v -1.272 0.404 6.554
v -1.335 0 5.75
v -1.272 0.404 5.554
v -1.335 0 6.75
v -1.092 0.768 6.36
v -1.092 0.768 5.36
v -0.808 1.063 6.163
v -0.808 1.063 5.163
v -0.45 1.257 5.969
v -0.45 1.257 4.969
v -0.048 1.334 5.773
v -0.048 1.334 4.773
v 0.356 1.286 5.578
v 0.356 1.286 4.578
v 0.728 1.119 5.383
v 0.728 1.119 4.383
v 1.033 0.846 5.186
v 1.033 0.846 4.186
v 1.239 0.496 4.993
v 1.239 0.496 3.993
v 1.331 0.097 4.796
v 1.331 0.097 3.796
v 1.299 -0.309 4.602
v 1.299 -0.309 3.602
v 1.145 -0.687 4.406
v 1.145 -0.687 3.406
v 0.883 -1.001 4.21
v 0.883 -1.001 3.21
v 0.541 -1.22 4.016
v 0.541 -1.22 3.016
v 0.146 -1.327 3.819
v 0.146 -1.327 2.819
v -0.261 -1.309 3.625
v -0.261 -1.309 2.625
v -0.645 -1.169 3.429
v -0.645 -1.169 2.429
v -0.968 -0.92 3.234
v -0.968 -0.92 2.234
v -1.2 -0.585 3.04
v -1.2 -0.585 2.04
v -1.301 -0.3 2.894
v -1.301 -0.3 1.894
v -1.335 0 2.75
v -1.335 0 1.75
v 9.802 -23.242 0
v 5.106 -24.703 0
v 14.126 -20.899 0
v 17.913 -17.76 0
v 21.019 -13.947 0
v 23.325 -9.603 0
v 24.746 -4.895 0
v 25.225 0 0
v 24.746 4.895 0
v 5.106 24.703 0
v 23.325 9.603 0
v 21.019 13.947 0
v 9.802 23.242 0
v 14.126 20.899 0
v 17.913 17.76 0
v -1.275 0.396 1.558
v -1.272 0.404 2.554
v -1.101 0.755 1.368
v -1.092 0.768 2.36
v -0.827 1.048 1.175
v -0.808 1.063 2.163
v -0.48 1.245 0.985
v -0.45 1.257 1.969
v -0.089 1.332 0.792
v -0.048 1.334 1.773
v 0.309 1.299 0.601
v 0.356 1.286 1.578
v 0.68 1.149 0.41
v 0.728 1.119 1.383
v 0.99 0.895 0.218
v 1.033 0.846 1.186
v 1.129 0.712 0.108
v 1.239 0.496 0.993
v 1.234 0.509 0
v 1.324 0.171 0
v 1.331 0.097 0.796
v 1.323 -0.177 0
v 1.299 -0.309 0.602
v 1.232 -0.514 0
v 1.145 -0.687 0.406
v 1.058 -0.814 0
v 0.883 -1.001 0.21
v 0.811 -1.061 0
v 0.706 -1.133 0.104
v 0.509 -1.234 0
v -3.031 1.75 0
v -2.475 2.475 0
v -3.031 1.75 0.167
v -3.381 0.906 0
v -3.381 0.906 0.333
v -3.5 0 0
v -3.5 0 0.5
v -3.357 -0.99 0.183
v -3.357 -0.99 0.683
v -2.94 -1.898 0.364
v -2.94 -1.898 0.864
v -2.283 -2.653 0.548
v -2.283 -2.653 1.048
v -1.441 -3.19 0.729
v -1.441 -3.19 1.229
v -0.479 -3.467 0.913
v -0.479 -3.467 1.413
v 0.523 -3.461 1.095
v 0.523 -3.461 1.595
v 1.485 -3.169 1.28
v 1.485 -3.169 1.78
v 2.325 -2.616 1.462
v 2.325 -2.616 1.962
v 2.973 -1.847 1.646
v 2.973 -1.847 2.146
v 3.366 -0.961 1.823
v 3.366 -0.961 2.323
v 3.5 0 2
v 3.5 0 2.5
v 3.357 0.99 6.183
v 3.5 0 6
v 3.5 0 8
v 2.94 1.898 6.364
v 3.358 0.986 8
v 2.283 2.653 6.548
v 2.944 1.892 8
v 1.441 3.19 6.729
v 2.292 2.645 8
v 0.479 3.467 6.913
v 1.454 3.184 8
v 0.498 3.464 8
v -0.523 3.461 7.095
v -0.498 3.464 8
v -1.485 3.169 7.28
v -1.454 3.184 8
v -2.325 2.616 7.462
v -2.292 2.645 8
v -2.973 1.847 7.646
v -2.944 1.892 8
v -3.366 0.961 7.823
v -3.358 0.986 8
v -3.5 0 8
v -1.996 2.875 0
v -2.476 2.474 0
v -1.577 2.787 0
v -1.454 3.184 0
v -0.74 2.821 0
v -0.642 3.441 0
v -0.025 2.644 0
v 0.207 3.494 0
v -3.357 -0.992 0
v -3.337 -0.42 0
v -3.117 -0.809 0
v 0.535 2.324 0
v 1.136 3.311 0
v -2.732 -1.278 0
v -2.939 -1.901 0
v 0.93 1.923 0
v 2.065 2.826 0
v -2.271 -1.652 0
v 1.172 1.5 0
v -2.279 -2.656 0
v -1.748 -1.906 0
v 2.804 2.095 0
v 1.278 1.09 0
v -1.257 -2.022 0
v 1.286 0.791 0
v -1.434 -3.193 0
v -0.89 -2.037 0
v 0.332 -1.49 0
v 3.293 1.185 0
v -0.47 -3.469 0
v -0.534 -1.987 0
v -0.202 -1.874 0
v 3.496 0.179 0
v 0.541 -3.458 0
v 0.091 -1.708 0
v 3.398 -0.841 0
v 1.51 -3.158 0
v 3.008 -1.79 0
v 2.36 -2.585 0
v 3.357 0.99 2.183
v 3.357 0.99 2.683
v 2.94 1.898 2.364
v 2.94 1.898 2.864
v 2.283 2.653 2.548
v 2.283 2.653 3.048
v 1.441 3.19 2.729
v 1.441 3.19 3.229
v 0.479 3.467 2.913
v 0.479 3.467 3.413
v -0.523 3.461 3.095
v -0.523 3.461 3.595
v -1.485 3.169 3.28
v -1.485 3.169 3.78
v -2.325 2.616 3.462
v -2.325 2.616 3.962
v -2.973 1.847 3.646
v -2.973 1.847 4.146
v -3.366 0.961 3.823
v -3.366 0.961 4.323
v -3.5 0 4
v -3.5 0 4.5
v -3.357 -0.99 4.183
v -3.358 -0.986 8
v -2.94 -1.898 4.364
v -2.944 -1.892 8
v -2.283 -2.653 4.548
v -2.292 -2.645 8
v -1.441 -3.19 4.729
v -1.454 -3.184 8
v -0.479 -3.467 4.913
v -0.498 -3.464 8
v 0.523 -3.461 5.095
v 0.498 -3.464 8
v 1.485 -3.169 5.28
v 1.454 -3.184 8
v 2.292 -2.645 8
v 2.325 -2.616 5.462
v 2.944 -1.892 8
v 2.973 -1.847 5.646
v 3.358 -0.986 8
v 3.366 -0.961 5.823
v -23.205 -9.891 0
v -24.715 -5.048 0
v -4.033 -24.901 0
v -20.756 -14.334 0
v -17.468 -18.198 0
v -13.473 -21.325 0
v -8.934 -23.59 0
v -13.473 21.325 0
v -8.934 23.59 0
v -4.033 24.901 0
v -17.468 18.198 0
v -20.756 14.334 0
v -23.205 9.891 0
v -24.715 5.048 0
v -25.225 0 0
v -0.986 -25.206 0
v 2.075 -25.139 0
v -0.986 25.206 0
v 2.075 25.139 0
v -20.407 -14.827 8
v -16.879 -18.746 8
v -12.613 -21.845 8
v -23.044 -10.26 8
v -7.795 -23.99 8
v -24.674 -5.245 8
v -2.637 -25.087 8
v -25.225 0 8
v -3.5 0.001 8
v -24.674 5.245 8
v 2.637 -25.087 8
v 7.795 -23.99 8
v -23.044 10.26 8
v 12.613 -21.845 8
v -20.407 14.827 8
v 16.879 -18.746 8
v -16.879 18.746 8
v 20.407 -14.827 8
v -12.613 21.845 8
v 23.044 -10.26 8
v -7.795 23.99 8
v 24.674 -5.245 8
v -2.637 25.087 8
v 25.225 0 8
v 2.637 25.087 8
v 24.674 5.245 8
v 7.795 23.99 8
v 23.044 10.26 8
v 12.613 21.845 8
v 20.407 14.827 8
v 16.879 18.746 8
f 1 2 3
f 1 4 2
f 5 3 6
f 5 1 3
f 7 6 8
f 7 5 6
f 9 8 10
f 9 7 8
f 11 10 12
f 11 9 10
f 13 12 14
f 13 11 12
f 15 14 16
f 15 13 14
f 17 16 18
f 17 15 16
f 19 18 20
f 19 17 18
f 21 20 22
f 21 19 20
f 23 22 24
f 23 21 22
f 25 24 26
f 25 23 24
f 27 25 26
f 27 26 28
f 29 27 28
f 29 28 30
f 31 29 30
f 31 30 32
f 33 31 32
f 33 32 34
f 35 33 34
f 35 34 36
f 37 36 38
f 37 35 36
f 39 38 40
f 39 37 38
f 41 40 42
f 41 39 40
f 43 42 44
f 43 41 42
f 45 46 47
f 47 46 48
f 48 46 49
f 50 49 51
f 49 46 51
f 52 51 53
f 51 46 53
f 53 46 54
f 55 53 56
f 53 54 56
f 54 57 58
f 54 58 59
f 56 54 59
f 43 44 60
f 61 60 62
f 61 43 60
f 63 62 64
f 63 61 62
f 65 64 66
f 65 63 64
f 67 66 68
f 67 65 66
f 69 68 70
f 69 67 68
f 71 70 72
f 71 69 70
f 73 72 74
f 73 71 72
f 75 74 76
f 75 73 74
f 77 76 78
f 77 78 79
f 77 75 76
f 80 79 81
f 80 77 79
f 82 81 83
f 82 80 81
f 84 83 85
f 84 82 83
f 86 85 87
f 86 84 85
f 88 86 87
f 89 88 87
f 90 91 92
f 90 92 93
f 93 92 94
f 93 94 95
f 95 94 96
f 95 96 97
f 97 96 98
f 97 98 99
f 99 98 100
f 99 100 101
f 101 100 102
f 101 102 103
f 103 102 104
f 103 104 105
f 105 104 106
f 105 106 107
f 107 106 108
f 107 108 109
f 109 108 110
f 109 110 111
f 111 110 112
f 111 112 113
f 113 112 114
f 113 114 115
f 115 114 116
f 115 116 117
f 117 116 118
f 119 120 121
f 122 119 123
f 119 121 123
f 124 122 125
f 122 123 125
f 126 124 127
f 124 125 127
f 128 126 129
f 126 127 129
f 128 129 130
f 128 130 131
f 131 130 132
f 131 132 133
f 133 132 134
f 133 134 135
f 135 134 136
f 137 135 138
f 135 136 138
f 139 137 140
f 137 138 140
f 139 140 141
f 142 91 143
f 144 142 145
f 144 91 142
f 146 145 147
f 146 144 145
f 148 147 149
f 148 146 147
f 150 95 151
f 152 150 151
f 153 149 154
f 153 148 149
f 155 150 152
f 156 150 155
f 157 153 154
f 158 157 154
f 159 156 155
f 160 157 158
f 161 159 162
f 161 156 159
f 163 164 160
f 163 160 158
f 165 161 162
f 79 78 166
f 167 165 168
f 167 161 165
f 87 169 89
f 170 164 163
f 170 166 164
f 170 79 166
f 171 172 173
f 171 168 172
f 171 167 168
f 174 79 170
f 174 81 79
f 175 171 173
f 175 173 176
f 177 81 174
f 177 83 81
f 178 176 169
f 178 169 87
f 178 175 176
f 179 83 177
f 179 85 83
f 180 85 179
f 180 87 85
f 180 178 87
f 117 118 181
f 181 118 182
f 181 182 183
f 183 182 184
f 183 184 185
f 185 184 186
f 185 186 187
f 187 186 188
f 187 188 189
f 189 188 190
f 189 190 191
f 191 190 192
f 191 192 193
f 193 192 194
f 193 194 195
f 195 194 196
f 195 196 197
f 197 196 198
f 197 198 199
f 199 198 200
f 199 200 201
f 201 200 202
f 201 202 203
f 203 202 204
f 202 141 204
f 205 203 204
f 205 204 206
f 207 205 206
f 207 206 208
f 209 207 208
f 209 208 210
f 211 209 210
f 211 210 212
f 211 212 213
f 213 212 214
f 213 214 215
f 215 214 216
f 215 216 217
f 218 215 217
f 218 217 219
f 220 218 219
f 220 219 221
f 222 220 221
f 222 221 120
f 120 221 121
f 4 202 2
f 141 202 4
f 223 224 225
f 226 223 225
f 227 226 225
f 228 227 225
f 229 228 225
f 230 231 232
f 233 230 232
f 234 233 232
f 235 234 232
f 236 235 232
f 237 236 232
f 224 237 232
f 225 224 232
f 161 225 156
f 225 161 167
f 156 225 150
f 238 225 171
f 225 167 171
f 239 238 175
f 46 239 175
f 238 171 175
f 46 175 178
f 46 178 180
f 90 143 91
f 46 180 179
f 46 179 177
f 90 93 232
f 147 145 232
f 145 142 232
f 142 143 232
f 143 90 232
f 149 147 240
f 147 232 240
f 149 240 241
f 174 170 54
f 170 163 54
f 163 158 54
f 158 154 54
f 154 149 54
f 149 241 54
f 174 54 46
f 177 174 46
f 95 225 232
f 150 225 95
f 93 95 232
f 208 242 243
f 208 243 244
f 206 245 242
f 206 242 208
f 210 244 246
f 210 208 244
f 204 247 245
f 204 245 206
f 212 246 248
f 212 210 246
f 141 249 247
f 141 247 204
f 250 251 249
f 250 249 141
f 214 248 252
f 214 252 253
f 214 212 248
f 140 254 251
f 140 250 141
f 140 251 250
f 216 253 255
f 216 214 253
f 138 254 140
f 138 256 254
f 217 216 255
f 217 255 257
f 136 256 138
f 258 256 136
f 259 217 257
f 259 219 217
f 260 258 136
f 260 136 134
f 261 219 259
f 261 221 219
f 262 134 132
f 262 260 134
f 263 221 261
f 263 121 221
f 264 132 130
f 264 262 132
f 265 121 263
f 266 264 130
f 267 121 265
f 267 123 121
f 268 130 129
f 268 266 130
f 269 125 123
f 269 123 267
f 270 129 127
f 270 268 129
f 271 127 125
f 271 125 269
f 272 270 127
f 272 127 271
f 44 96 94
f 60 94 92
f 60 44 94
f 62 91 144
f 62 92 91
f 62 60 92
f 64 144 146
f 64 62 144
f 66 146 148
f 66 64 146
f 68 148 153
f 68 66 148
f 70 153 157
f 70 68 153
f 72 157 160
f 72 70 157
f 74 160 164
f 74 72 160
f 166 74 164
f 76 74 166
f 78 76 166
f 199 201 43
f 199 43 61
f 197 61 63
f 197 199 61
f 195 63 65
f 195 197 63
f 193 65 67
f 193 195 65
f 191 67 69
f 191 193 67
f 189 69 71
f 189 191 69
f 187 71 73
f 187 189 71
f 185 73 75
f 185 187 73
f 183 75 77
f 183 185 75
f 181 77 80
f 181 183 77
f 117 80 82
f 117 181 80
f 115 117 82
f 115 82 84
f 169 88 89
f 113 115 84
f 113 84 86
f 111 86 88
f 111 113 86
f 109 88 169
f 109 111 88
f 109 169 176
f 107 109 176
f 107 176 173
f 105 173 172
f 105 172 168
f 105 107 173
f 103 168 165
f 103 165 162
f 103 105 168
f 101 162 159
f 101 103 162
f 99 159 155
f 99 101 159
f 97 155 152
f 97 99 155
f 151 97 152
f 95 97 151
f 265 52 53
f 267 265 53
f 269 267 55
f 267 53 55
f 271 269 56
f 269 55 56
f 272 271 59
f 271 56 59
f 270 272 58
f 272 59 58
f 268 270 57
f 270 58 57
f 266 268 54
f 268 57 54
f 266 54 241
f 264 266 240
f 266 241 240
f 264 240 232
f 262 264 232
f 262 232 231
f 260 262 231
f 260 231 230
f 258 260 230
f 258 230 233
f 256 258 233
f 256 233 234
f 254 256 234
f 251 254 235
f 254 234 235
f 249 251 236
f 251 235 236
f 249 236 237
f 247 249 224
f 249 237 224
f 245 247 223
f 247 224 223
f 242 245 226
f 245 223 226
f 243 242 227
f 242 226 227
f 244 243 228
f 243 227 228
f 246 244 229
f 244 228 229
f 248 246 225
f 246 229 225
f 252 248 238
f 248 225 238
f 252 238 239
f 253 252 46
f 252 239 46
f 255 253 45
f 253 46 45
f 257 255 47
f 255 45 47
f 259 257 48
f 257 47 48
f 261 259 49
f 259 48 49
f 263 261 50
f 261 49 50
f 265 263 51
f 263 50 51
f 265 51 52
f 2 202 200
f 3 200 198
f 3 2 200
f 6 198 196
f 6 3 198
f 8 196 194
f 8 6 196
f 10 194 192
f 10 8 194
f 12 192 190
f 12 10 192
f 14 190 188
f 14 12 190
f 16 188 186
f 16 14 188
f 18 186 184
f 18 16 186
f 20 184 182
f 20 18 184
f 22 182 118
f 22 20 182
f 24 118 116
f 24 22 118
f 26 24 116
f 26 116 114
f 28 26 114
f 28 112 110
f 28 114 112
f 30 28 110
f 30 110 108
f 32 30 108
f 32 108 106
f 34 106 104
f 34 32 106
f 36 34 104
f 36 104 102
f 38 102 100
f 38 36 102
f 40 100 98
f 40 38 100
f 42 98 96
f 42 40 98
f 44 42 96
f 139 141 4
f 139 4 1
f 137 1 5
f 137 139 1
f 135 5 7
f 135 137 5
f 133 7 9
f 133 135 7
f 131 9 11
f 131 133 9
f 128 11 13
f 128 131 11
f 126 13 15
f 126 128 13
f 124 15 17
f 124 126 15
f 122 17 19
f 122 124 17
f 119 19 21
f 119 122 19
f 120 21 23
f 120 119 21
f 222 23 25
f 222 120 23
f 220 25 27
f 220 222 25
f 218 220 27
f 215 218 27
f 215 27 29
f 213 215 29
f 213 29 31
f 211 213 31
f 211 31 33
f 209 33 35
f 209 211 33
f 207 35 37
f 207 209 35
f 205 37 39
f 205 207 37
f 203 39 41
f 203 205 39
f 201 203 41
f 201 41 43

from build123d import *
from build123d.topology import SkipClean

# Parameters (mm, degrees)
CROQUIS1_R                 = 25.225
SALIENTE_EXTRUIR1_DEPTH    = 8
CROQUIS8_R                 = 3.5
CORTAR_EXTRUIR1_DEPTH      = 8
ROSCA1_PITCH               = 4
CORTAR_EXTRUIR2_DEPTH      = 37.559595635
CORTAR_EXTRUIR2_DEPTH_BACK = 37.559595635
CROQUIS11_W                = 9.138603142
CROQUIS11_H                = 6.021536875


with BuildPart() as part:
    # Croquis1 → Saliente-Extruir1 (new body)
    with BuildSketch(Plane.XY):
        Circle(CROQUIS1_R)
    extrude(amount=SALIENTE_EXTRUIR1_DEPTH)

    # Croquis8 → Cortar-Extruir1 (cut)
    with BuildSketch(Plane.XY.offset(8)):
        Circle(CROQUIS8_R)
    extrude(amount=-CORTAR_EXTRUIR1_DEPTH, mode=Mode.SUBTRACT)

    # Rosca1: the profile of Perfil de rosca2 profile screwed along a right-hand helix of 2 turns, 12 arcs to a turn; built about Z, then put on its axis
    with SkipClean():  # the faces are left unmerged after this step: merging them gives an invalid solid
        rosca1_z = Axis((0, 0, 0), (0, 0, 1))
        rosca1_corners = [(3.5003, 0, -0.000173205), (3.5003, 0, 3.500173194), (1.3349365, 0, 2.249999995), (1.3349365, 0, 1.249999995)]
        with BuildLine(mode=Mode.PRIVATE) as rosca1_profile:
            Line(rosca1_corners[0], rosca1_corners[1])
            Line(rosca1_corners[1], rosca1_corners[2])
            Line(rosca1_corners[2], rosca1_corners[3])
            Line(rosca1_corners[3], rosca1_corners[0])
        rosca1_cap = Face(rosca1_profile.wire())
        rosca1_turn_angles = [0, 15, 30, 45, 60, 75, 90, 105, 120, 135, 150, 165, 180, 195, 210, 225, 240, 255, 270, 285, 300, 315, 330, 345, 360]
        rosca1_turn_weights = [1, 0.9659258262890683, 1, 0.9659258262890683, 1, 0.9659258262890683, 1, 0.9659258262890683, 1, 0.9659258262890683, 1, 0.9659258262890683, 1, 0.9659258262890683, 1, 0.9659258262890683, 1, 0.9659258262890683, 1, 0.9659258262890683, 1, 0.9659258262890683, 1, 0.9659258262890683, 1]
        rosca1_turn_rails = [Edge.make_bspline([Vector(p[0], p[1], 0).rotate(rosca1_z, rosca1_turn_angles[k]) / rosca1_turn_weights[k] + Vector(0, 0, p[2] + ROSCA1_PITCH * rosca1_turn_angles[k] / 360) for k in range(25)], [0, 0, 0, 1, 1, 2, 2, 3, 3, 4, 4, 5, 5, 6, 6, 7, 7, 8, 8, 9, 9, 10, 10, 11, 11, 12, 12, 12], 2, rosca1_turn_weights) for p in rosca1_corners]
        rosca1_turn_sides = [Face.make_surface_from_curves(rosca1_turn_rails[p[0]], rosca1_turn_rails[p[1]]) for p in [(0, 1), (1, 2), (2, 3), (3, 0)]]
        rosca1 = Plane(origin=(0, 0, 8), x_dir=(-1, 0, 0), z_dir=(0, 0, -1)) * Solid(Shell([*[p.moved(Location((0, 0, ROSCA1_PITCH * i))) for i in range(2) for p in rosca1_turn_sides], rosca1_cap, rosca1_cap.rotate(rosca1_z, 720).moved(Location((0, 0, ROSCA1_PITCH * 720 / 360)))]))
        add(rosca1)

    # Croquis11 → Cortar-Extruir2 (cut, two sides: drawn at the far end of the back side and taken through both)
    with SkipClean():  # the faces are left unmerged after this step: merging them gives an invalid solid
        with BuildSketch(Plane(origin=(0, 0, 0), x_dir=(1, 0, 0), z_dir=(0, 1, 0)).offset(-CORTAR_EXTRUIR2_DEPTH_BACK)):
            with Locations((0.536755305, 3.010768438)):
                Rectangle(CROQUIS11_W, CROQUIS11_H)
        extrude(amount=CORTAR_EXTRUIR2_DEPTH + CORTAR_EXTRUIR2_DEPTH_BACK, mode=Mode.SUBTRACT)


solid = part.part
